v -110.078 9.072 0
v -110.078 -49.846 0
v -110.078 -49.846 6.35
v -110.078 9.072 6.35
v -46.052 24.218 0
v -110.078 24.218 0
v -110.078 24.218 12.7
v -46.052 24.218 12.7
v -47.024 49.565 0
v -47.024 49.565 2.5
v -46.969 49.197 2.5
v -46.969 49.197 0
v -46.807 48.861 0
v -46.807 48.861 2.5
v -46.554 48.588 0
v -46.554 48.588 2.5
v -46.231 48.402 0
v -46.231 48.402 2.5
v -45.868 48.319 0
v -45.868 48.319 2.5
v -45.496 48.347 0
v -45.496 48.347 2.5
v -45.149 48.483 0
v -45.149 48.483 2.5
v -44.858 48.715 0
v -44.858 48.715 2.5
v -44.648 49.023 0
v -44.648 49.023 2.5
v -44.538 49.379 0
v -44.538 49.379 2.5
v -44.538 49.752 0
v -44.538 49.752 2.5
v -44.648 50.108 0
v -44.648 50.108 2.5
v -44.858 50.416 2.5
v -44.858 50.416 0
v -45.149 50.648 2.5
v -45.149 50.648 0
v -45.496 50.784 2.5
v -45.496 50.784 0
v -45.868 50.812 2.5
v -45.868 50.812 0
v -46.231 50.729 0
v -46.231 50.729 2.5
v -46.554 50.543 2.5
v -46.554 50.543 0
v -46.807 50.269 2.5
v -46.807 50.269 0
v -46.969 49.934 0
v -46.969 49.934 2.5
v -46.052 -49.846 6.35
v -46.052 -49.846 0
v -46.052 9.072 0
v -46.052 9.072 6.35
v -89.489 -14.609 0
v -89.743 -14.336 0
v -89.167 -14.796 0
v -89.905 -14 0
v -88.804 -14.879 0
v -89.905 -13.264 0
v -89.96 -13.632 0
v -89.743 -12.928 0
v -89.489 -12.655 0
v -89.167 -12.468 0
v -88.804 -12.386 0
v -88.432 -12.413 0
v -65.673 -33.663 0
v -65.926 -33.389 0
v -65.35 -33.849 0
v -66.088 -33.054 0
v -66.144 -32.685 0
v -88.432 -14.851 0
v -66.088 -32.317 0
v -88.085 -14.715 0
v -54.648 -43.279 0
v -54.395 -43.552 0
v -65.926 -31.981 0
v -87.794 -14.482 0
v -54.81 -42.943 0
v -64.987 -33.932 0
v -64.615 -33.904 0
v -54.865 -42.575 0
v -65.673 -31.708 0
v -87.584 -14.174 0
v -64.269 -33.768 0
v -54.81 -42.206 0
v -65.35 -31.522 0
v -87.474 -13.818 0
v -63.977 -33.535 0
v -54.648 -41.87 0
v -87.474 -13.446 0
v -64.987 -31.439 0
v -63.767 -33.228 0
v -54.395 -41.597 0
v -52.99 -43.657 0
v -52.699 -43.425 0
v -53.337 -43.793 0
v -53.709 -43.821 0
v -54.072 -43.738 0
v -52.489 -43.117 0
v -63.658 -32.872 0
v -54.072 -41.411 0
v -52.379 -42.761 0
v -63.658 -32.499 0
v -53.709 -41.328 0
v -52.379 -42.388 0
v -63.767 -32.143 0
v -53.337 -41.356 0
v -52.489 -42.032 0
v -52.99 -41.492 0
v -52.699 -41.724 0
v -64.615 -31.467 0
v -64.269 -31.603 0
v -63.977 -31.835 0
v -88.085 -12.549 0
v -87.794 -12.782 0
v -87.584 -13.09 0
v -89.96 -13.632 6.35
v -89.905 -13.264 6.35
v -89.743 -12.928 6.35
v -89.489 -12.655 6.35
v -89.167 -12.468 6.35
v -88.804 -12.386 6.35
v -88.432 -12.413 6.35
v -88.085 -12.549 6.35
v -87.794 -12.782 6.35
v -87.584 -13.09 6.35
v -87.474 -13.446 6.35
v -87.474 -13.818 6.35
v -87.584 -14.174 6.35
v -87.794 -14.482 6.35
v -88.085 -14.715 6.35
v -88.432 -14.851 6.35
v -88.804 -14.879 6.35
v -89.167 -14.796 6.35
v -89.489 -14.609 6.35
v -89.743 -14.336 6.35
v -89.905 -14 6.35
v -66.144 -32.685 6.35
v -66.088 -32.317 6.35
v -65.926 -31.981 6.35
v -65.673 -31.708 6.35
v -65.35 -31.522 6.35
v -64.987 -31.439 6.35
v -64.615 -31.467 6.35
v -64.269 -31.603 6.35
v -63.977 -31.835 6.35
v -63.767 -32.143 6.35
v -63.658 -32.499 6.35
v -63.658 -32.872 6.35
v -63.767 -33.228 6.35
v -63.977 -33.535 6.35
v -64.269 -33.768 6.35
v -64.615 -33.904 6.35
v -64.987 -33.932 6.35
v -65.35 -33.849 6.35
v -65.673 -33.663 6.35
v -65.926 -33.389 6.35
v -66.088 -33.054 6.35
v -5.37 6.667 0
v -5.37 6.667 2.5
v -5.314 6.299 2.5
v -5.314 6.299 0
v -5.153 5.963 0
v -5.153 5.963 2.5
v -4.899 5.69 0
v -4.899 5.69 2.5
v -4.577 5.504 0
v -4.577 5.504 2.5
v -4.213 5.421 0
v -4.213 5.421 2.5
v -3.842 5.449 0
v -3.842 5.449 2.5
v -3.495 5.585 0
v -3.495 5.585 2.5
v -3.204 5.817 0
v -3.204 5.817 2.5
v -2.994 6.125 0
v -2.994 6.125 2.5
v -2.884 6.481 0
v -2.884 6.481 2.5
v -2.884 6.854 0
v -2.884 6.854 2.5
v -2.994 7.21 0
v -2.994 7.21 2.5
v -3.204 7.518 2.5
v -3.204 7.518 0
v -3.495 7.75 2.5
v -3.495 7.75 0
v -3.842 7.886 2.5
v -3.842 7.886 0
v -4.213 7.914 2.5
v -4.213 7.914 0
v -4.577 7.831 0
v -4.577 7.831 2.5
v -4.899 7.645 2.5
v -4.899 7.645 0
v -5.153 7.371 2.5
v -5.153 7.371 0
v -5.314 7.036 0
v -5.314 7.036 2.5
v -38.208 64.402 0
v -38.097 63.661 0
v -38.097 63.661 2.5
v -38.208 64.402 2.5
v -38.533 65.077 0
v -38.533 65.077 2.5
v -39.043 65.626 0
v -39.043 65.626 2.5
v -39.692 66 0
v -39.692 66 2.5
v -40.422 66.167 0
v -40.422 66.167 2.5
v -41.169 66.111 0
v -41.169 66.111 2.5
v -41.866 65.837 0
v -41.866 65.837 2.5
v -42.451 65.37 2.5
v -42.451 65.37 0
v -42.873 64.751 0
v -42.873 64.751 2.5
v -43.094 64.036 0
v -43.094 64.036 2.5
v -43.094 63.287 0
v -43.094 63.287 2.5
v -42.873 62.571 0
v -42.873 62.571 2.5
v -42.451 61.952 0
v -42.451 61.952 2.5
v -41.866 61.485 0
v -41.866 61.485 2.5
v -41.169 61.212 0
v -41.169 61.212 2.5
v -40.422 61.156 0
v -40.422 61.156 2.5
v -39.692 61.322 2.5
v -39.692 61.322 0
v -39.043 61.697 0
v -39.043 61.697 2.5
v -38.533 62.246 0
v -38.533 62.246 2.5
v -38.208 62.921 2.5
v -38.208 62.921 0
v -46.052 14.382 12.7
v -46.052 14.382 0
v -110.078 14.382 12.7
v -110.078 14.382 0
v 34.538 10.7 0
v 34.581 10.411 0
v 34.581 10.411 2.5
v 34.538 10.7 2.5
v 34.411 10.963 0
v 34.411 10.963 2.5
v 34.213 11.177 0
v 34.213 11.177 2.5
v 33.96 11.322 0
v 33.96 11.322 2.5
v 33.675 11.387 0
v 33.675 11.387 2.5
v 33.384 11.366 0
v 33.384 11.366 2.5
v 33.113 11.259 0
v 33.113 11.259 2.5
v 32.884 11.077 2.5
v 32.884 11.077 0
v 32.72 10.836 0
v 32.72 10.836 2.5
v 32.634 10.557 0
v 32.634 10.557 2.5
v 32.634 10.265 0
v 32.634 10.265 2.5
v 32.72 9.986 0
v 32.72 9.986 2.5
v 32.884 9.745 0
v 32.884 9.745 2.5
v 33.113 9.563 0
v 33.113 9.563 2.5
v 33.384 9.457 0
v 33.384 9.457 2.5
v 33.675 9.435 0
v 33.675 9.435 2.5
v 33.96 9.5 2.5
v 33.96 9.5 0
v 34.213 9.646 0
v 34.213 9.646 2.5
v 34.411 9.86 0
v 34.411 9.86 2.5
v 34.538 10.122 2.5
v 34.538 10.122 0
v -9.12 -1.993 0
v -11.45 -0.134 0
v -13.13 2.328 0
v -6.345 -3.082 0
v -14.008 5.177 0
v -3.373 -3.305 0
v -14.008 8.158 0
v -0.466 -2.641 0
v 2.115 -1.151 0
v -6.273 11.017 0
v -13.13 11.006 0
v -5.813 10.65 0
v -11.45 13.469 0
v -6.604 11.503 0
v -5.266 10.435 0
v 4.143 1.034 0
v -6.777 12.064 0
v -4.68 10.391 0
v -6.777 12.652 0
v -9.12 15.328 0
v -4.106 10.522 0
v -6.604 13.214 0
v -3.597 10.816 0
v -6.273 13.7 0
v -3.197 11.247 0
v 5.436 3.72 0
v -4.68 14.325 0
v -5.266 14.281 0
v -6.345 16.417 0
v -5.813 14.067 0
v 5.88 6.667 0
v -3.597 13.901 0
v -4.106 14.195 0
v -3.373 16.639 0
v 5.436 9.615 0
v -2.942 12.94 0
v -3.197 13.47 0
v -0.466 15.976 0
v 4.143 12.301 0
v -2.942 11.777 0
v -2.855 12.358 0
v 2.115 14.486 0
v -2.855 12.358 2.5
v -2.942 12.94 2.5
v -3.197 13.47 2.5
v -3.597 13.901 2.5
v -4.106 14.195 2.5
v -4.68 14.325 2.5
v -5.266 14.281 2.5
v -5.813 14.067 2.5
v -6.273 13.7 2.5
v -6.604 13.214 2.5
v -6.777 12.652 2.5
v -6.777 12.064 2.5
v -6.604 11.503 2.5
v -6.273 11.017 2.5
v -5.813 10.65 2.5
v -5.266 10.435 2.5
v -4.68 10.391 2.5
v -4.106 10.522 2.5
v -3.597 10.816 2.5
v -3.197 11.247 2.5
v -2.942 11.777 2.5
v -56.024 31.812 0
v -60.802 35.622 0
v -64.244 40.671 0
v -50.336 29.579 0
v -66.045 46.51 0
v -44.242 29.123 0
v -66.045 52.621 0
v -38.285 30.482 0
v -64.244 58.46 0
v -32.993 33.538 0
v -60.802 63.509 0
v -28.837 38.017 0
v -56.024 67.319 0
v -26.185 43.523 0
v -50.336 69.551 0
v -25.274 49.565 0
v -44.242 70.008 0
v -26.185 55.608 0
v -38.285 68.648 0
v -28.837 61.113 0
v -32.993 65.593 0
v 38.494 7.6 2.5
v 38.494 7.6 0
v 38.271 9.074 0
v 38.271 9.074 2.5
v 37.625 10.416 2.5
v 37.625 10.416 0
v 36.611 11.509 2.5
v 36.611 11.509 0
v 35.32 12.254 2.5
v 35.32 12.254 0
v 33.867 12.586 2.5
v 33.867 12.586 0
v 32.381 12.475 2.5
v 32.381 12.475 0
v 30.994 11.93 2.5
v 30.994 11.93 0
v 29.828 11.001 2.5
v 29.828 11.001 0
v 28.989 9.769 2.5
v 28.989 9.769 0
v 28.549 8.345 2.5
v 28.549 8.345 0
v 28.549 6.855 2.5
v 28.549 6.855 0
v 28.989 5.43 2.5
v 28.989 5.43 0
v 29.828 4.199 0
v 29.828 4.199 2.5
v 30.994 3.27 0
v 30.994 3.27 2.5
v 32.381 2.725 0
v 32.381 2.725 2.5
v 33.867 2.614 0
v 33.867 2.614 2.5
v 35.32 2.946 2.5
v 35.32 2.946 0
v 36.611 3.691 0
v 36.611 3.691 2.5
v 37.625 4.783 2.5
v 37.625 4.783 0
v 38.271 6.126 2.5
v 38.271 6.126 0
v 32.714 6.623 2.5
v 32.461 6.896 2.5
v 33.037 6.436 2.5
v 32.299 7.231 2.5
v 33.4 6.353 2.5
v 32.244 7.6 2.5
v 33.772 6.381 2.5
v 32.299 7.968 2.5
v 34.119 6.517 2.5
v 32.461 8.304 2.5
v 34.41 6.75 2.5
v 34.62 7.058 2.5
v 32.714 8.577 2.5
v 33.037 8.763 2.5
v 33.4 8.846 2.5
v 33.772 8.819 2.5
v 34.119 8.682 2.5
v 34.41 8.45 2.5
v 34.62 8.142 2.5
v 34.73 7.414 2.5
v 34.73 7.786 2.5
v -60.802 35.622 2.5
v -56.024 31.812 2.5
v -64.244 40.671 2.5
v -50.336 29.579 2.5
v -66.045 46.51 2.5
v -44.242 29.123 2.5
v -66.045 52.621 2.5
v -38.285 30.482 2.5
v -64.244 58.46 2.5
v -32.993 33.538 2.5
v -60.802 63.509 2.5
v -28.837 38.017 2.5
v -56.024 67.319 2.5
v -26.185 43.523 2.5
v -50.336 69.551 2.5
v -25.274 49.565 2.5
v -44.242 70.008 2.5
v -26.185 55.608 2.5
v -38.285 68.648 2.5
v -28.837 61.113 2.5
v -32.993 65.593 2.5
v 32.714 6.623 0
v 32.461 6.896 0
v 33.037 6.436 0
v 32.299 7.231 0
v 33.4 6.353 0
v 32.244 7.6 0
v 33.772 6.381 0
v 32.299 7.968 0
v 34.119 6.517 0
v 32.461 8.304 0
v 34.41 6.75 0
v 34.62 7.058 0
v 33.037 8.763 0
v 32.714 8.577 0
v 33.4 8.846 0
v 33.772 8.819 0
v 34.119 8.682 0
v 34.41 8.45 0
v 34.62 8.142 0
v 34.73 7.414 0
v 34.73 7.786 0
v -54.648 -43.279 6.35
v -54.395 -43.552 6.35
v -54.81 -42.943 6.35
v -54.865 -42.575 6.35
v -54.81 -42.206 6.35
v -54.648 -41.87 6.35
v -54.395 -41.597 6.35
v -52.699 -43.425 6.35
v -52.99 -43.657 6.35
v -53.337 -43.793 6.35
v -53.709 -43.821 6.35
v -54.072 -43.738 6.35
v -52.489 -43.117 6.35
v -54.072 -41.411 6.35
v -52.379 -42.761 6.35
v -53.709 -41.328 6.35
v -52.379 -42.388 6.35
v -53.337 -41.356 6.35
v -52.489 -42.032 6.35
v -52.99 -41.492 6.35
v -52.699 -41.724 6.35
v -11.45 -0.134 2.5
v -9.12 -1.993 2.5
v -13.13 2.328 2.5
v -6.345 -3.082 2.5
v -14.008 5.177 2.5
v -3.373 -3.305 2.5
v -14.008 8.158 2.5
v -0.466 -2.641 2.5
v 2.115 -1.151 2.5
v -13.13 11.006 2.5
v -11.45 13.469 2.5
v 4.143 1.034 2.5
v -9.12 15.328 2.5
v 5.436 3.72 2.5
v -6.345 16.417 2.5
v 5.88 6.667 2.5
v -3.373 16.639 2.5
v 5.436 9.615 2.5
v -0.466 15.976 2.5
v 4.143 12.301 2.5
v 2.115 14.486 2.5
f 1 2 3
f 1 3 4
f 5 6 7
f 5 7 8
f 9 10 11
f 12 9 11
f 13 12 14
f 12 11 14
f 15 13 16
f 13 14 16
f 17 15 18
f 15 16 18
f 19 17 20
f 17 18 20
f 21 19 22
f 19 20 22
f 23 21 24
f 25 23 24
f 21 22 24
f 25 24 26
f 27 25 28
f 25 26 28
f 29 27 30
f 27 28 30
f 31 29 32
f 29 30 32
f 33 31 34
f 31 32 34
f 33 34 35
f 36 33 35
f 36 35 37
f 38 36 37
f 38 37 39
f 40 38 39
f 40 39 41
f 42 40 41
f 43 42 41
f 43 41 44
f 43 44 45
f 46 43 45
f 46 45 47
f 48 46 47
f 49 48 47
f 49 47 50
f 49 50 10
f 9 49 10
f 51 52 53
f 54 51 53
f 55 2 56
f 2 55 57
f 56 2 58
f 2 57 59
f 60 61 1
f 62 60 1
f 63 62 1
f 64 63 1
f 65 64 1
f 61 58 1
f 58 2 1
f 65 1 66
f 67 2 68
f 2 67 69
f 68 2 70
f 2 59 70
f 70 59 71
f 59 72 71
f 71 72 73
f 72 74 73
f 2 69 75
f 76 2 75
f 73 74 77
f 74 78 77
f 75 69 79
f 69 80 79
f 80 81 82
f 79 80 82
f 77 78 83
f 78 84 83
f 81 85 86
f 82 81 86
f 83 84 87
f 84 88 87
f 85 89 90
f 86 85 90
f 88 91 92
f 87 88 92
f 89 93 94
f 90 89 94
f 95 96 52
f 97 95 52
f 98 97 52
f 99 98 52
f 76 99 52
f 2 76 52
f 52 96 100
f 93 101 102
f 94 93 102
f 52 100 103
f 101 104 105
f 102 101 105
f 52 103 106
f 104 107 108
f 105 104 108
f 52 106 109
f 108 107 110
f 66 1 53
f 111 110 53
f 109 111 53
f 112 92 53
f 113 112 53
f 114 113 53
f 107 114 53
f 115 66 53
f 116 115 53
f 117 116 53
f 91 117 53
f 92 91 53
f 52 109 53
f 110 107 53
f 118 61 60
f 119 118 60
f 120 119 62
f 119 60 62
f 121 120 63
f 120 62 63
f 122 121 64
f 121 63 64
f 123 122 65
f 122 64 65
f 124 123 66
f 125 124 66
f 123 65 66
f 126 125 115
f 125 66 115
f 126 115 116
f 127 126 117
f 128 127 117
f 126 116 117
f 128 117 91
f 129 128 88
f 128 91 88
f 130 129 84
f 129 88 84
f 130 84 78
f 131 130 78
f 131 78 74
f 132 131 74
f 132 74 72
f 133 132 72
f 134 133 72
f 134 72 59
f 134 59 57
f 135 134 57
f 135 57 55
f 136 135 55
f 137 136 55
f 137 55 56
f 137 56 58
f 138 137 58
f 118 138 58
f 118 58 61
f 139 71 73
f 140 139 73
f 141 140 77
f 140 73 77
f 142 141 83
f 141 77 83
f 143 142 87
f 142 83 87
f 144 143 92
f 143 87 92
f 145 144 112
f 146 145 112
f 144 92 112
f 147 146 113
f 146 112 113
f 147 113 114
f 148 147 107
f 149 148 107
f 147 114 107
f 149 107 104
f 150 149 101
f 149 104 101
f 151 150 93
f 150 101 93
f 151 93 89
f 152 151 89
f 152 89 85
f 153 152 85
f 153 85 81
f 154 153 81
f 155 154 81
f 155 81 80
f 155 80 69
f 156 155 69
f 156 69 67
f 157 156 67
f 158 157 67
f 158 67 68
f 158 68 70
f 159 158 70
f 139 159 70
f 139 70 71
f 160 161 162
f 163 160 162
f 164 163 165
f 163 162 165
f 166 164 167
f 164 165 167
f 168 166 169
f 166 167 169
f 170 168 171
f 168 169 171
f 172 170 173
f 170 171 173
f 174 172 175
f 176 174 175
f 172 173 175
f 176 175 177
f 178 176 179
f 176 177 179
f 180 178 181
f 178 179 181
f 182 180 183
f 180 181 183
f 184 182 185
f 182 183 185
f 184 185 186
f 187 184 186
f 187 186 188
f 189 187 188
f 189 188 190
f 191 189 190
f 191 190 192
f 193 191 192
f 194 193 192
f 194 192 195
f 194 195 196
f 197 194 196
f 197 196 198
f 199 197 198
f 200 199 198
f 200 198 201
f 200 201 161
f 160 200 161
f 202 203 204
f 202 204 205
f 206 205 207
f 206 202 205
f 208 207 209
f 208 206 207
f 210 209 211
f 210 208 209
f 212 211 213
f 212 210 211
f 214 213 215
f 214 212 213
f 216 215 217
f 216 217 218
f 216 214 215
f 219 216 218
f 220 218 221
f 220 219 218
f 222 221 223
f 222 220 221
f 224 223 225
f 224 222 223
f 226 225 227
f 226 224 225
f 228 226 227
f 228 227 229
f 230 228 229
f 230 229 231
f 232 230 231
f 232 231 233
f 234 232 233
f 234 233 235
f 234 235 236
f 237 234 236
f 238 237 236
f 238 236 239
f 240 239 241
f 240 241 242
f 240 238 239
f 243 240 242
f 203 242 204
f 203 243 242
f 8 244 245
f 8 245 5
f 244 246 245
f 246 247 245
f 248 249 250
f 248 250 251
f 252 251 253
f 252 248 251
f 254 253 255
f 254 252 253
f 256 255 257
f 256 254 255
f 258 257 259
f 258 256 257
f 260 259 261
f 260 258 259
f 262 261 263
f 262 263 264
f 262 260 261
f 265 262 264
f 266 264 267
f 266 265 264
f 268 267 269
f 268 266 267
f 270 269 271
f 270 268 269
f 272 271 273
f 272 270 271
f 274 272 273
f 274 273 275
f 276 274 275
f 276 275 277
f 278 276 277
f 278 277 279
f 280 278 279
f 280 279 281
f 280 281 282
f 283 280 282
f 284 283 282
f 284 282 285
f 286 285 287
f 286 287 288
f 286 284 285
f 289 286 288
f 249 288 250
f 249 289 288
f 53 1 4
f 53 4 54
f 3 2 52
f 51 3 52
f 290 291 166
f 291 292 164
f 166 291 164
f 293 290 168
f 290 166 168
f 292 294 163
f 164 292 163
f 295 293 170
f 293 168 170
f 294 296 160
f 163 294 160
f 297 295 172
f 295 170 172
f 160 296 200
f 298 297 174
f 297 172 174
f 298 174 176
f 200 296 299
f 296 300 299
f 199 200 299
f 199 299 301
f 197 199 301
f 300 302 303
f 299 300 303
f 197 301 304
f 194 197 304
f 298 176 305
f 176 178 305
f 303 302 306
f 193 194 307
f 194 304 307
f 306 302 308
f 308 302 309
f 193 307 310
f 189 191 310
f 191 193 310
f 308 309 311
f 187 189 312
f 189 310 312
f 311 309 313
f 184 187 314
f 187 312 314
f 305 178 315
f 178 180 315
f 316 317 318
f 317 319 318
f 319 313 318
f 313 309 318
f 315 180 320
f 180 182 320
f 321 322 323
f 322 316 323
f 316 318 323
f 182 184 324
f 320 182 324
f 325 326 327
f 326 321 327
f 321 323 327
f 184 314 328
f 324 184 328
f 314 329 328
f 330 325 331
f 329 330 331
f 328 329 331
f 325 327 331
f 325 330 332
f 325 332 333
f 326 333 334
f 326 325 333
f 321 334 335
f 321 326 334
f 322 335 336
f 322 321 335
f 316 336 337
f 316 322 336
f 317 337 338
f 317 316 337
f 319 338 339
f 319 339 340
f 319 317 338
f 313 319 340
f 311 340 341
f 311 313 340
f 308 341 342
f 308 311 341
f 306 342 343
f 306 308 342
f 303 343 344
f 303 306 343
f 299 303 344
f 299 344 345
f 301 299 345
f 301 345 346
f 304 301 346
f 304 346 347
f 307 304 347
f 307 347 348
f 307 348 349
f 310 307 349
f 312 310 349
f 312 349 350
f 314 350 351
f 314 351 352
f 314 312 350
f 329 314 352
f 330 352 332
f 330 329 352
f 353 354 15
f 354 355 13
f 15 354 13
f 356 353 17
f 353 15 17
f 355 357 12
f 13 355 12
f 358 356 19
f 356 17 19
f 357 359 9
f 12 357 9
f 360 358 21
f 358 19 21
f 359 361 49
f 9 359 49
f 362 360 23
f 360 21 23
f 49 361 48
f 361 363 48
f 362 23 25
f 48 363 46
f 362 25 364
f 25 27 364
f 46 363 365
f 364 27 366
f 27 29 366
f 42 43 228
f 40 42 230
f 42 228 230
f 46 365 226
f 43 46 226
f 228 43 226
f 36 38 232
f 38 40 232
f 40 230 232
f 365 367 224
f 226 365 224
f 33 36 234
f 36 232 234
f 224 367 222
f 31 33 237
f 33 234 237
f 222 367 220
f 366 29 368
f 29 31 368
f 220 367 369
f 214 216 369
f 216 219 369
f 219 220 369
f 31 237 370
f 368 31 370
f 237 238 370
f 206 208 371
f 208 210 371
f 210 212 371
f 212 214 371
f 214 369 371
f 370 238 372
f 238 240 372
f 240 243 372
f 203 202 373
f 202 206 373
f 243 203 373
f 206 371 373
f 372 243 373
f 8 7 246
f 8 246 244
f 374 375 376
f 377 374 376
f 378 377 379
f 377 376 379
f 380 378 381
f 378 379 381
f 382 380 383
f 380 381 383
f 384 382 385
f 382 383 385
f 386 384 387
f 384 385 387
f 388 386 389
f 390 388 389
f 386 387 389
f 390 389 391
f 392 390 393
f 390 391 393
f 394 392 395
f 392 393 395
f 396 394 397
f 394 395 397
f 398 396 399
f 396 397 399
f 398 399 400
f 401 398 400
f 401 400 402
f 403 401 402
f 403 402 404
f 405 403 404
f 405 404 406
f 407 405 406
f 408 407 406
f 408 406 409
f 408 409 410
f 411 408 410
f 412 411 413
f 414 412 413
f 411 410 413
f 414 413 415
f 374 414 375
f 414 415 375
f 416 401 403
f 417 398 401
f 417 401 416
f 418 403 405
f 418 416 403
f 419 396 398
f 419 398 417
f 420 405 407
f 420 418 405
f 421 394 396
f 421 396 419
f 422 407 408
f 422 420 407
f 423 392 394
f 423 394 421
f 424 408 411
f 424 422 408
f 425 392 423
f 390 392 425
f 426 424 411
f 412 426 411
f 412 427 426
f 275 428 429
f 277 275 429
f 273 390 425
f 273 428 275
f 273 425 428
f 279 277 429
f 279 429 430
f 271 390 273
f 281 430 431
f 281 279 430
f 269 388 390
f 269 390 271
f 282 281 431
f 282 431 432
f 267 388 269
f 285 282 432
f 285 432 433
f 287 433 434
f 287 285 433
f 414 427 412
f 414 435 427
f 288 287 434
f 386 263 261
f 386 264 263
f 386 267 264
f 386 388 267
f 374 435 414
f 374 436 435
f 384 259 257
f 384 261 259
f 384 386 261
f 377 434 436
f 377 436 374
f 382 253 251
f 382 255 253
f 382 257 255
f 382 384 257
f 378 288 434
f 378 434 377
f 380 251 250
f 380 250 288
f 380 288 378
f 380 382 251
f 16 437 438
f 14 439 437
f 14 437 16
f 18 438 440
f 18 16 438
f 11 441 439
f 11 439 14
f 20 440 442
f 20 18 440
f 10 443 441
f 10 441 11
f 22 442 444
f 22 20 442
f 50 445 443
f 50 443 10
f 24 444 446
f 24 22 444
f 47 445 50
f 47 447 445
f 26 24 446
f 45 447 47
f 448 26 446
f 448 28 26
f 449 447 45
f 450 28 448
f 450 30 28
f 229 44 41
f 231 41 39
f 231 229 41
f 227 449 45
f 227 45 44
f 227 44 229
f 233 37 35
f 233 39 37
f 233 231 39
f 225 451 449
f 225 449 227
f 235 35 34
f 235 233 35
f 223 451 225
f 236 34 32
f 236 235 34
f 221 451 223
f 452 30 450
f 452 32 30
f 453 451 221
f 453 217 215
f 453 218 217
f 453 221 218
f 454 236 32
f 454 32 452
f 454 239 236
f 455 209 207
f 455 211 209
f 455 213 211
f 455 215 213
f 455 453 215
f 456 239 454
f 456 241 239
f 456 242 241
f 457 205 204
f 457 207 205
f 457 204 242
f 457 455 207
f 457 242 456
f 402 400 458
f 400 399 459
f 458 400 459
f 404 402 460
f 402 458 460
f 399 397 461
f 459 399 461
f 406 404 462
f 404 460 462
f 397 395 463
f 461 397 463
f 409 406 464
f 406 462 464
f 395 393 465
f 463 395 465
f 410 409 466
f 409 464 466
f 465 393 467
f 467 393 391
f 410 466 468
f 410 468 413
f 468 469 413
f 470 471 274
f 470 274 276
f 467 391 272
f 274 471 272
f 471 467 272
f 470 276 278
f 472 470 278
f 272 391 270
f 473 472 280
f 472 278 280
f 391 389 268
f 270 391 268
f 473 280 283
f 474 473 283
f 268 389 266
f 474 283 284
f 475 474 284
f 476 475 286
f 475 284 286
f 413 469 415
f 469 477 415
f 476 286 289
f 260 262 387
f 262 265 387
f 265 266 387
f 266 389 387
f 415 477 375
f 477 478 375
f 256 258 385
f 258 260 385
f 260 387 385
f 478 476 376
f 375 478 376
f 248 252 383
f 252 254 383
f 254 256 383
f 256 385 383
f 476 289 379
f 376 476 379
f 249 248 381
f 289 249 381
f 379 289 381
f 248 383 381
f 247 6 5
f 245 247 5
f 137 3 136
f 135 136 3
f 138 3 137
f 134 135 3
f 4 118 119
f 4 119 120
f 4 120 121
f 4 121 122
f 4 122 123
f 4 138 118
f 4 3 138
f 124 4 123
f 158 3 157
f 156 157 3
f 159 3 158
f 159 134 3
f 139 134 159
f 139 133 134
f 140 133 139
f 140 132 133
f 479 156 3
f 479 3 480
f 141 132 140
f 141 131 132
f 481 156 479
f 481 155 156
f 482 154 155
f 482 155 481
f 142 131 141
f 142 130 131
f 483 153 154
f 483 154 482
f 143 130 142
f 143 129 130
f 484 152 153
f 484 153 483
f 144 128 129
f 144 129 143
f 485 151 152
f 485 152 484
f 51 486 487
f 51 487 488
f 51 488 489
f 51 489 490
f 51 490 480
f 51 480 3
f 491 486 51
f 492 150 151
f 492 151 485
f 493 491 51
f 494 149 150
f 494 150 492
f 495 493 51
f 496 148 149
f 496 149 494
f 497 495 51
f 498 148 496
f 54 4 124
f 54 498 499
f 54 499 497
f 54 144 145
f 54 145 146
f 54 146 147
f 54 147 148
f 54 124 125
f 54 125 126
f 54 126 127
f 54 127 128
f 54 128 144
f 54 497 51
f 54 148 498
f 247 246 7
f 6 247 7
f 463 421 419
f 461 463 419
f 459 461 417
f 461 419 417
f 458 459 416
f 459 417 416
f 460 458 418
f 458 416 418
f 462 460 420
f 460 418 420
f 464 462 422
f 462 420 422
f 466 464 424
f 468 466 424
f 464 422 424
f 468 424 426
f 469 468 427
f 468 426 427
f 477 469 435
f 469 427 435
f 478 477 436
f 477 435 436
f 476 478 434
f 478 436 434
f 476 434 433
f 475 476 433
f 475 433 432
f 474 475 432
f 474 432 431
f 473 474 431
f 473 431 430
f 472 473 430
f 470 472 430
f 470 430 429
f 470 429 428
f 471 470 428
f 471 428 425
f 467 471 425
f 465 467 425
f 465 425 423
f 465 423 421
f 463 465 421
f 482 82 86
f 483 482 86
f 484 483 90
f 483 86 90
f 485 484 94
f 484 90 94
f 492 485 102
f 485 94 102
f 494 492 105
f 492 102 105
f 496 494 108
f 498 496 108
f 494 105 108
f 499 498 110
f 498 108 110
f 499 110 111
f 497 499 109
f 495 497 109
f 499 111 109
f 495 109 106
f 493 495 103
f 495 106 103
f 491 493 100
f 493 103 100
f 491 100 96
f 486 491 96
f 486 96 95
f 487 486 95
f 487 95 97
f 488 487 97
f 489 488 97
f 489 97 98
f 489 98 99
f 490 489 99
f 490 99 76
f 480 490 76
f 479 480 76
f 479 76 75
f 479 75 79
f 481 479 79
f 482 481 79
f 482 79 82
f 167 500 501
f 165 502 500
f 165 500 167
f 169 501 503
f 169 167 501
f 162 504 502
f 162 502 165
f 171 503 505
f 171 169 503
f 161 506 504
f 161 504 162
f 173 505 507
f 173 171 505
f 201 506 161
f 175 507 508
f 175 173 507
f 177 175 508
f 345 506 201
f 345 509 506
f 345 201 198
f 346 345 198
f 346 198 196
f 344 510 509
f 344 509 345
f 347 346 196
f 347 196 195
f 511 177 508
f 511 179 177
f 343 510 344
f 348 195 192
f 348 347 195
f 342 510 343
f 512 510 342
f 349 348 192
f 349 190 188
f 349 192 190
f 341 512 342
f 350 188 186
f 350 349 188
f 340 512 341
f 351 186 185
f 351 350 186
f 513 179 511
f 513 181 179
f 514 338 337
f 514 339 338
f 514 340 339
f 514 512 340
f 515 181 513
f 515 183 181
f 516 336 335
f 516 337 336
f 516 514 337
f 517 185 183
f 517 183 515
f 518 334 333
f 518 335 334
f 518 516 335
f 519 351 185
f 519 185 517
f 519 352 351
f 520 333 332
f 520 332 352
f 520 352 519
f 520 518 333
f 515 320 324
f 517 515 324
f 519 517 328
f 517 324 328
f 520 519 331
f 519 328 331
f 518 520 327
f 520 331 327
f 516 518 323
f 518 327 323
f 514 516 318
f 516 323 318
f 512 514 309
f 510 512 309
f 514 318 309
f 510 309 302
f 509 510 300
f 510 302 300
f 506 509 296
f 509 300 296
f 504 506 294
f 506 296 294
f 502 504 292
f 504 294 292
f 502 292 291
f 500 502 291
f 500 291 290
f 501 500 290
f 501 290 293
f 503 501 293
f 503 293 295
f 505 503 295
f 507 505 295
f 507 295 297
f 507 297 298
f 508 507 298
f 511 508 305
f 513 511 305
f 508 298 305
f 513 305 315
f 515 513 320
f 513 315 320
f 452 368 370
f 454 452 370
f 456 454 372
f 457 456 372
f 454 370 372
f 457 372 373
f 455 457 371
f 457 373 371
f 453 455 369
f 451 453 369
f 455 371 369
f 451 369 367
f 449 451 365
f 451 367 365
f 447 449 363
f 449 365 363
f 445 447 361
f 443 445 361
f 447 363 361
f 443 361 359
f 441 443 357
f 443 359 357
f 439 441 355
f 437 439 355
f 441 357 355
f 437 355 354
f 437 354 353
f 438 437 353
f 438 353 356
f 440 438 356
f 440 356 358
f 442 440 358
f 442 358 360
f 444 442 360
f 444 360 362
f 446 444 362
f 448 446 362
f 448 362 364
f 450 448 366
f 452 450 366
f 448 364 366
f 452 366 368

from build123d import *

# Parameters (mm, degrees)
F1_R             = 10
F1_R_2           = 1.9724824491
F2_DEPTH         = 2.5
F1_R_3           = 5
F1_R_4           = 0.9790800152
F0_R             = 20.5
F0_R_2           = 2.5126354118
F3_W             = 64.0254840255
F3_H             = 58.9180318639
F4_DEPTH         = 6.35
F3_H_2           = 9.8366048187
F5_DEPTH         = 6.35
F6_D             = 2.5
F8_D             = 2.5
F8_COPIES_COUNT  = 2
F8_COPIES_PITCH  = 30.5
F8_COPIES1_COUNT = 2
F8_COPIES1_PITCH = 45.489759
F10_D            = 2.5
F10_2_D          = 2.5


# Not quite as in the source:
# - a feature of the source that left no trace in its solid (it failed there, or was rolled back) is left out
# - a pattern or mirror of a feature is missing from the dataset's text; its kind, count and spacing are read off the source's solid


with BuildPart() as f2:
    # F1 (on Top) → F2 (new body)
    with BuildSketch(Plane.XY):
        with Locations((-4.1198744439, 6.6673322581)):
            Circle(F1_R)
        with Locations((-4.8270216212, 12.3583702371)):
            Circle(F1_R_2, mode=Mode.SUBTRACT)
    extrude(amount=F2_DEPTH)

    # F10 (through all)
    with Locations(Plane(origin=(0, 0, 0), x_dir=(1, 0, 0), z_dir=(0, 0, -1))):
        with Locations((-4.1198744439, -6.6673322581), (33.4935821593, -7.599897217)):
            Hole(F10_D / 2)


with BuildPart() as f2b:
    # F1 (on Top) → F2, piece 2 (new body)
    with BuildSketch(Plane.XY):
        with Locations((33.4935821593, 7.599897217)):
            Circle(F1_R_3)
        with Locations((33.6022078991, 10.4110669345)):
            Circle(F1_R_4, mode=Mode.SUBTRACT)
    extrude(amount=F2_DEPTH)

    # F10#2 (through all)
    with Locations(Plane(origin=(0, 0, 0), x_dir=(1, 0, 0), z_dir=(0, 0, -1))):
        with Locations((-4.1198744439, -6.6673322581), (33.4935821593, -7.599897217)):
            Hole(F10_2_D / 2)


with BuildPart() as f2c:
    # F0 (on Top) → F2, piece 3 (new body)
    with BuildSketch(Plane.XY):
        with Locations((-45.774448663, 49.5653226972)):
            Circle(F0_R)
        with Locations((-40.6095050275, 63.6612325907)):
            Circle(F0_R_2, mode=Mode.SUBTRACT)
    extrude(amount=F2_DEPTH)

    # F6 (through all)
    with Locations(Plane(origin=(0, 0, 0), x_dir=(1, 0, 0), z_dir=(0, 0, -1))):
        with Locations((-45.774448663, -49.5653226972)):
            Hole(F6_D / 2)


with BuildPart() as f4:
    # F3 (on Top) → F4 (new body)
    with BuildSketch(Plane.XY):
        with Locations((-78.0650638044, -20.3869701363)):
            Rectangle(F3_W, F3_H)
    extrude(amount=F4_DEPTH)

    # F8 (through all)
    with Locations(Plane.XY.offset(6.35)):
        with Locations((-88.7101224427, -13.6320184063)):
            f8 = Hole(F8_D / 2)

    # F8_copies: F8 ×2
    with Locations(*[Vector(0.7808687891, -0.6246950729, 0) * (i * F8_COPIES_PITCH) for i in range(1, F8_COPIES_COUNT)]):
        add(f8, mode=Mode.SUBTRACT)

    # F8_copies1: F8 ×2
    with Locations(*[Vector(0.7714882729, -0.636243542, 0) * (i * F8_COPIES1_PITCH) for i in range(1, F8_COPIES1_COUNT)]):
        add(f8, mode=Mode.SUBTRACT)


with BuildPart() as f4b:
    # F3 (on Top) → F4, piece 2 (new body)
    with BuildSketch(Plane.XY):
        with Locations((-78.0650638044, 19.3000948057)):
            Rectangle(F3_W, F3_H_2)
    extrude(amount=F4_DEPTH)

    # F5 (add): a face of the model
    f5_faces = [f4b.faces().sort_by_distance(p)[0] for p in [
        (-78.0650638044, 19.3000948057, 6.35),
    ]]
    extrude(f5_faces, amount=F5_DEPTH)


solid = Compound([f2.part, f2b.part, f2c.part, f4.part, f4b.part])
